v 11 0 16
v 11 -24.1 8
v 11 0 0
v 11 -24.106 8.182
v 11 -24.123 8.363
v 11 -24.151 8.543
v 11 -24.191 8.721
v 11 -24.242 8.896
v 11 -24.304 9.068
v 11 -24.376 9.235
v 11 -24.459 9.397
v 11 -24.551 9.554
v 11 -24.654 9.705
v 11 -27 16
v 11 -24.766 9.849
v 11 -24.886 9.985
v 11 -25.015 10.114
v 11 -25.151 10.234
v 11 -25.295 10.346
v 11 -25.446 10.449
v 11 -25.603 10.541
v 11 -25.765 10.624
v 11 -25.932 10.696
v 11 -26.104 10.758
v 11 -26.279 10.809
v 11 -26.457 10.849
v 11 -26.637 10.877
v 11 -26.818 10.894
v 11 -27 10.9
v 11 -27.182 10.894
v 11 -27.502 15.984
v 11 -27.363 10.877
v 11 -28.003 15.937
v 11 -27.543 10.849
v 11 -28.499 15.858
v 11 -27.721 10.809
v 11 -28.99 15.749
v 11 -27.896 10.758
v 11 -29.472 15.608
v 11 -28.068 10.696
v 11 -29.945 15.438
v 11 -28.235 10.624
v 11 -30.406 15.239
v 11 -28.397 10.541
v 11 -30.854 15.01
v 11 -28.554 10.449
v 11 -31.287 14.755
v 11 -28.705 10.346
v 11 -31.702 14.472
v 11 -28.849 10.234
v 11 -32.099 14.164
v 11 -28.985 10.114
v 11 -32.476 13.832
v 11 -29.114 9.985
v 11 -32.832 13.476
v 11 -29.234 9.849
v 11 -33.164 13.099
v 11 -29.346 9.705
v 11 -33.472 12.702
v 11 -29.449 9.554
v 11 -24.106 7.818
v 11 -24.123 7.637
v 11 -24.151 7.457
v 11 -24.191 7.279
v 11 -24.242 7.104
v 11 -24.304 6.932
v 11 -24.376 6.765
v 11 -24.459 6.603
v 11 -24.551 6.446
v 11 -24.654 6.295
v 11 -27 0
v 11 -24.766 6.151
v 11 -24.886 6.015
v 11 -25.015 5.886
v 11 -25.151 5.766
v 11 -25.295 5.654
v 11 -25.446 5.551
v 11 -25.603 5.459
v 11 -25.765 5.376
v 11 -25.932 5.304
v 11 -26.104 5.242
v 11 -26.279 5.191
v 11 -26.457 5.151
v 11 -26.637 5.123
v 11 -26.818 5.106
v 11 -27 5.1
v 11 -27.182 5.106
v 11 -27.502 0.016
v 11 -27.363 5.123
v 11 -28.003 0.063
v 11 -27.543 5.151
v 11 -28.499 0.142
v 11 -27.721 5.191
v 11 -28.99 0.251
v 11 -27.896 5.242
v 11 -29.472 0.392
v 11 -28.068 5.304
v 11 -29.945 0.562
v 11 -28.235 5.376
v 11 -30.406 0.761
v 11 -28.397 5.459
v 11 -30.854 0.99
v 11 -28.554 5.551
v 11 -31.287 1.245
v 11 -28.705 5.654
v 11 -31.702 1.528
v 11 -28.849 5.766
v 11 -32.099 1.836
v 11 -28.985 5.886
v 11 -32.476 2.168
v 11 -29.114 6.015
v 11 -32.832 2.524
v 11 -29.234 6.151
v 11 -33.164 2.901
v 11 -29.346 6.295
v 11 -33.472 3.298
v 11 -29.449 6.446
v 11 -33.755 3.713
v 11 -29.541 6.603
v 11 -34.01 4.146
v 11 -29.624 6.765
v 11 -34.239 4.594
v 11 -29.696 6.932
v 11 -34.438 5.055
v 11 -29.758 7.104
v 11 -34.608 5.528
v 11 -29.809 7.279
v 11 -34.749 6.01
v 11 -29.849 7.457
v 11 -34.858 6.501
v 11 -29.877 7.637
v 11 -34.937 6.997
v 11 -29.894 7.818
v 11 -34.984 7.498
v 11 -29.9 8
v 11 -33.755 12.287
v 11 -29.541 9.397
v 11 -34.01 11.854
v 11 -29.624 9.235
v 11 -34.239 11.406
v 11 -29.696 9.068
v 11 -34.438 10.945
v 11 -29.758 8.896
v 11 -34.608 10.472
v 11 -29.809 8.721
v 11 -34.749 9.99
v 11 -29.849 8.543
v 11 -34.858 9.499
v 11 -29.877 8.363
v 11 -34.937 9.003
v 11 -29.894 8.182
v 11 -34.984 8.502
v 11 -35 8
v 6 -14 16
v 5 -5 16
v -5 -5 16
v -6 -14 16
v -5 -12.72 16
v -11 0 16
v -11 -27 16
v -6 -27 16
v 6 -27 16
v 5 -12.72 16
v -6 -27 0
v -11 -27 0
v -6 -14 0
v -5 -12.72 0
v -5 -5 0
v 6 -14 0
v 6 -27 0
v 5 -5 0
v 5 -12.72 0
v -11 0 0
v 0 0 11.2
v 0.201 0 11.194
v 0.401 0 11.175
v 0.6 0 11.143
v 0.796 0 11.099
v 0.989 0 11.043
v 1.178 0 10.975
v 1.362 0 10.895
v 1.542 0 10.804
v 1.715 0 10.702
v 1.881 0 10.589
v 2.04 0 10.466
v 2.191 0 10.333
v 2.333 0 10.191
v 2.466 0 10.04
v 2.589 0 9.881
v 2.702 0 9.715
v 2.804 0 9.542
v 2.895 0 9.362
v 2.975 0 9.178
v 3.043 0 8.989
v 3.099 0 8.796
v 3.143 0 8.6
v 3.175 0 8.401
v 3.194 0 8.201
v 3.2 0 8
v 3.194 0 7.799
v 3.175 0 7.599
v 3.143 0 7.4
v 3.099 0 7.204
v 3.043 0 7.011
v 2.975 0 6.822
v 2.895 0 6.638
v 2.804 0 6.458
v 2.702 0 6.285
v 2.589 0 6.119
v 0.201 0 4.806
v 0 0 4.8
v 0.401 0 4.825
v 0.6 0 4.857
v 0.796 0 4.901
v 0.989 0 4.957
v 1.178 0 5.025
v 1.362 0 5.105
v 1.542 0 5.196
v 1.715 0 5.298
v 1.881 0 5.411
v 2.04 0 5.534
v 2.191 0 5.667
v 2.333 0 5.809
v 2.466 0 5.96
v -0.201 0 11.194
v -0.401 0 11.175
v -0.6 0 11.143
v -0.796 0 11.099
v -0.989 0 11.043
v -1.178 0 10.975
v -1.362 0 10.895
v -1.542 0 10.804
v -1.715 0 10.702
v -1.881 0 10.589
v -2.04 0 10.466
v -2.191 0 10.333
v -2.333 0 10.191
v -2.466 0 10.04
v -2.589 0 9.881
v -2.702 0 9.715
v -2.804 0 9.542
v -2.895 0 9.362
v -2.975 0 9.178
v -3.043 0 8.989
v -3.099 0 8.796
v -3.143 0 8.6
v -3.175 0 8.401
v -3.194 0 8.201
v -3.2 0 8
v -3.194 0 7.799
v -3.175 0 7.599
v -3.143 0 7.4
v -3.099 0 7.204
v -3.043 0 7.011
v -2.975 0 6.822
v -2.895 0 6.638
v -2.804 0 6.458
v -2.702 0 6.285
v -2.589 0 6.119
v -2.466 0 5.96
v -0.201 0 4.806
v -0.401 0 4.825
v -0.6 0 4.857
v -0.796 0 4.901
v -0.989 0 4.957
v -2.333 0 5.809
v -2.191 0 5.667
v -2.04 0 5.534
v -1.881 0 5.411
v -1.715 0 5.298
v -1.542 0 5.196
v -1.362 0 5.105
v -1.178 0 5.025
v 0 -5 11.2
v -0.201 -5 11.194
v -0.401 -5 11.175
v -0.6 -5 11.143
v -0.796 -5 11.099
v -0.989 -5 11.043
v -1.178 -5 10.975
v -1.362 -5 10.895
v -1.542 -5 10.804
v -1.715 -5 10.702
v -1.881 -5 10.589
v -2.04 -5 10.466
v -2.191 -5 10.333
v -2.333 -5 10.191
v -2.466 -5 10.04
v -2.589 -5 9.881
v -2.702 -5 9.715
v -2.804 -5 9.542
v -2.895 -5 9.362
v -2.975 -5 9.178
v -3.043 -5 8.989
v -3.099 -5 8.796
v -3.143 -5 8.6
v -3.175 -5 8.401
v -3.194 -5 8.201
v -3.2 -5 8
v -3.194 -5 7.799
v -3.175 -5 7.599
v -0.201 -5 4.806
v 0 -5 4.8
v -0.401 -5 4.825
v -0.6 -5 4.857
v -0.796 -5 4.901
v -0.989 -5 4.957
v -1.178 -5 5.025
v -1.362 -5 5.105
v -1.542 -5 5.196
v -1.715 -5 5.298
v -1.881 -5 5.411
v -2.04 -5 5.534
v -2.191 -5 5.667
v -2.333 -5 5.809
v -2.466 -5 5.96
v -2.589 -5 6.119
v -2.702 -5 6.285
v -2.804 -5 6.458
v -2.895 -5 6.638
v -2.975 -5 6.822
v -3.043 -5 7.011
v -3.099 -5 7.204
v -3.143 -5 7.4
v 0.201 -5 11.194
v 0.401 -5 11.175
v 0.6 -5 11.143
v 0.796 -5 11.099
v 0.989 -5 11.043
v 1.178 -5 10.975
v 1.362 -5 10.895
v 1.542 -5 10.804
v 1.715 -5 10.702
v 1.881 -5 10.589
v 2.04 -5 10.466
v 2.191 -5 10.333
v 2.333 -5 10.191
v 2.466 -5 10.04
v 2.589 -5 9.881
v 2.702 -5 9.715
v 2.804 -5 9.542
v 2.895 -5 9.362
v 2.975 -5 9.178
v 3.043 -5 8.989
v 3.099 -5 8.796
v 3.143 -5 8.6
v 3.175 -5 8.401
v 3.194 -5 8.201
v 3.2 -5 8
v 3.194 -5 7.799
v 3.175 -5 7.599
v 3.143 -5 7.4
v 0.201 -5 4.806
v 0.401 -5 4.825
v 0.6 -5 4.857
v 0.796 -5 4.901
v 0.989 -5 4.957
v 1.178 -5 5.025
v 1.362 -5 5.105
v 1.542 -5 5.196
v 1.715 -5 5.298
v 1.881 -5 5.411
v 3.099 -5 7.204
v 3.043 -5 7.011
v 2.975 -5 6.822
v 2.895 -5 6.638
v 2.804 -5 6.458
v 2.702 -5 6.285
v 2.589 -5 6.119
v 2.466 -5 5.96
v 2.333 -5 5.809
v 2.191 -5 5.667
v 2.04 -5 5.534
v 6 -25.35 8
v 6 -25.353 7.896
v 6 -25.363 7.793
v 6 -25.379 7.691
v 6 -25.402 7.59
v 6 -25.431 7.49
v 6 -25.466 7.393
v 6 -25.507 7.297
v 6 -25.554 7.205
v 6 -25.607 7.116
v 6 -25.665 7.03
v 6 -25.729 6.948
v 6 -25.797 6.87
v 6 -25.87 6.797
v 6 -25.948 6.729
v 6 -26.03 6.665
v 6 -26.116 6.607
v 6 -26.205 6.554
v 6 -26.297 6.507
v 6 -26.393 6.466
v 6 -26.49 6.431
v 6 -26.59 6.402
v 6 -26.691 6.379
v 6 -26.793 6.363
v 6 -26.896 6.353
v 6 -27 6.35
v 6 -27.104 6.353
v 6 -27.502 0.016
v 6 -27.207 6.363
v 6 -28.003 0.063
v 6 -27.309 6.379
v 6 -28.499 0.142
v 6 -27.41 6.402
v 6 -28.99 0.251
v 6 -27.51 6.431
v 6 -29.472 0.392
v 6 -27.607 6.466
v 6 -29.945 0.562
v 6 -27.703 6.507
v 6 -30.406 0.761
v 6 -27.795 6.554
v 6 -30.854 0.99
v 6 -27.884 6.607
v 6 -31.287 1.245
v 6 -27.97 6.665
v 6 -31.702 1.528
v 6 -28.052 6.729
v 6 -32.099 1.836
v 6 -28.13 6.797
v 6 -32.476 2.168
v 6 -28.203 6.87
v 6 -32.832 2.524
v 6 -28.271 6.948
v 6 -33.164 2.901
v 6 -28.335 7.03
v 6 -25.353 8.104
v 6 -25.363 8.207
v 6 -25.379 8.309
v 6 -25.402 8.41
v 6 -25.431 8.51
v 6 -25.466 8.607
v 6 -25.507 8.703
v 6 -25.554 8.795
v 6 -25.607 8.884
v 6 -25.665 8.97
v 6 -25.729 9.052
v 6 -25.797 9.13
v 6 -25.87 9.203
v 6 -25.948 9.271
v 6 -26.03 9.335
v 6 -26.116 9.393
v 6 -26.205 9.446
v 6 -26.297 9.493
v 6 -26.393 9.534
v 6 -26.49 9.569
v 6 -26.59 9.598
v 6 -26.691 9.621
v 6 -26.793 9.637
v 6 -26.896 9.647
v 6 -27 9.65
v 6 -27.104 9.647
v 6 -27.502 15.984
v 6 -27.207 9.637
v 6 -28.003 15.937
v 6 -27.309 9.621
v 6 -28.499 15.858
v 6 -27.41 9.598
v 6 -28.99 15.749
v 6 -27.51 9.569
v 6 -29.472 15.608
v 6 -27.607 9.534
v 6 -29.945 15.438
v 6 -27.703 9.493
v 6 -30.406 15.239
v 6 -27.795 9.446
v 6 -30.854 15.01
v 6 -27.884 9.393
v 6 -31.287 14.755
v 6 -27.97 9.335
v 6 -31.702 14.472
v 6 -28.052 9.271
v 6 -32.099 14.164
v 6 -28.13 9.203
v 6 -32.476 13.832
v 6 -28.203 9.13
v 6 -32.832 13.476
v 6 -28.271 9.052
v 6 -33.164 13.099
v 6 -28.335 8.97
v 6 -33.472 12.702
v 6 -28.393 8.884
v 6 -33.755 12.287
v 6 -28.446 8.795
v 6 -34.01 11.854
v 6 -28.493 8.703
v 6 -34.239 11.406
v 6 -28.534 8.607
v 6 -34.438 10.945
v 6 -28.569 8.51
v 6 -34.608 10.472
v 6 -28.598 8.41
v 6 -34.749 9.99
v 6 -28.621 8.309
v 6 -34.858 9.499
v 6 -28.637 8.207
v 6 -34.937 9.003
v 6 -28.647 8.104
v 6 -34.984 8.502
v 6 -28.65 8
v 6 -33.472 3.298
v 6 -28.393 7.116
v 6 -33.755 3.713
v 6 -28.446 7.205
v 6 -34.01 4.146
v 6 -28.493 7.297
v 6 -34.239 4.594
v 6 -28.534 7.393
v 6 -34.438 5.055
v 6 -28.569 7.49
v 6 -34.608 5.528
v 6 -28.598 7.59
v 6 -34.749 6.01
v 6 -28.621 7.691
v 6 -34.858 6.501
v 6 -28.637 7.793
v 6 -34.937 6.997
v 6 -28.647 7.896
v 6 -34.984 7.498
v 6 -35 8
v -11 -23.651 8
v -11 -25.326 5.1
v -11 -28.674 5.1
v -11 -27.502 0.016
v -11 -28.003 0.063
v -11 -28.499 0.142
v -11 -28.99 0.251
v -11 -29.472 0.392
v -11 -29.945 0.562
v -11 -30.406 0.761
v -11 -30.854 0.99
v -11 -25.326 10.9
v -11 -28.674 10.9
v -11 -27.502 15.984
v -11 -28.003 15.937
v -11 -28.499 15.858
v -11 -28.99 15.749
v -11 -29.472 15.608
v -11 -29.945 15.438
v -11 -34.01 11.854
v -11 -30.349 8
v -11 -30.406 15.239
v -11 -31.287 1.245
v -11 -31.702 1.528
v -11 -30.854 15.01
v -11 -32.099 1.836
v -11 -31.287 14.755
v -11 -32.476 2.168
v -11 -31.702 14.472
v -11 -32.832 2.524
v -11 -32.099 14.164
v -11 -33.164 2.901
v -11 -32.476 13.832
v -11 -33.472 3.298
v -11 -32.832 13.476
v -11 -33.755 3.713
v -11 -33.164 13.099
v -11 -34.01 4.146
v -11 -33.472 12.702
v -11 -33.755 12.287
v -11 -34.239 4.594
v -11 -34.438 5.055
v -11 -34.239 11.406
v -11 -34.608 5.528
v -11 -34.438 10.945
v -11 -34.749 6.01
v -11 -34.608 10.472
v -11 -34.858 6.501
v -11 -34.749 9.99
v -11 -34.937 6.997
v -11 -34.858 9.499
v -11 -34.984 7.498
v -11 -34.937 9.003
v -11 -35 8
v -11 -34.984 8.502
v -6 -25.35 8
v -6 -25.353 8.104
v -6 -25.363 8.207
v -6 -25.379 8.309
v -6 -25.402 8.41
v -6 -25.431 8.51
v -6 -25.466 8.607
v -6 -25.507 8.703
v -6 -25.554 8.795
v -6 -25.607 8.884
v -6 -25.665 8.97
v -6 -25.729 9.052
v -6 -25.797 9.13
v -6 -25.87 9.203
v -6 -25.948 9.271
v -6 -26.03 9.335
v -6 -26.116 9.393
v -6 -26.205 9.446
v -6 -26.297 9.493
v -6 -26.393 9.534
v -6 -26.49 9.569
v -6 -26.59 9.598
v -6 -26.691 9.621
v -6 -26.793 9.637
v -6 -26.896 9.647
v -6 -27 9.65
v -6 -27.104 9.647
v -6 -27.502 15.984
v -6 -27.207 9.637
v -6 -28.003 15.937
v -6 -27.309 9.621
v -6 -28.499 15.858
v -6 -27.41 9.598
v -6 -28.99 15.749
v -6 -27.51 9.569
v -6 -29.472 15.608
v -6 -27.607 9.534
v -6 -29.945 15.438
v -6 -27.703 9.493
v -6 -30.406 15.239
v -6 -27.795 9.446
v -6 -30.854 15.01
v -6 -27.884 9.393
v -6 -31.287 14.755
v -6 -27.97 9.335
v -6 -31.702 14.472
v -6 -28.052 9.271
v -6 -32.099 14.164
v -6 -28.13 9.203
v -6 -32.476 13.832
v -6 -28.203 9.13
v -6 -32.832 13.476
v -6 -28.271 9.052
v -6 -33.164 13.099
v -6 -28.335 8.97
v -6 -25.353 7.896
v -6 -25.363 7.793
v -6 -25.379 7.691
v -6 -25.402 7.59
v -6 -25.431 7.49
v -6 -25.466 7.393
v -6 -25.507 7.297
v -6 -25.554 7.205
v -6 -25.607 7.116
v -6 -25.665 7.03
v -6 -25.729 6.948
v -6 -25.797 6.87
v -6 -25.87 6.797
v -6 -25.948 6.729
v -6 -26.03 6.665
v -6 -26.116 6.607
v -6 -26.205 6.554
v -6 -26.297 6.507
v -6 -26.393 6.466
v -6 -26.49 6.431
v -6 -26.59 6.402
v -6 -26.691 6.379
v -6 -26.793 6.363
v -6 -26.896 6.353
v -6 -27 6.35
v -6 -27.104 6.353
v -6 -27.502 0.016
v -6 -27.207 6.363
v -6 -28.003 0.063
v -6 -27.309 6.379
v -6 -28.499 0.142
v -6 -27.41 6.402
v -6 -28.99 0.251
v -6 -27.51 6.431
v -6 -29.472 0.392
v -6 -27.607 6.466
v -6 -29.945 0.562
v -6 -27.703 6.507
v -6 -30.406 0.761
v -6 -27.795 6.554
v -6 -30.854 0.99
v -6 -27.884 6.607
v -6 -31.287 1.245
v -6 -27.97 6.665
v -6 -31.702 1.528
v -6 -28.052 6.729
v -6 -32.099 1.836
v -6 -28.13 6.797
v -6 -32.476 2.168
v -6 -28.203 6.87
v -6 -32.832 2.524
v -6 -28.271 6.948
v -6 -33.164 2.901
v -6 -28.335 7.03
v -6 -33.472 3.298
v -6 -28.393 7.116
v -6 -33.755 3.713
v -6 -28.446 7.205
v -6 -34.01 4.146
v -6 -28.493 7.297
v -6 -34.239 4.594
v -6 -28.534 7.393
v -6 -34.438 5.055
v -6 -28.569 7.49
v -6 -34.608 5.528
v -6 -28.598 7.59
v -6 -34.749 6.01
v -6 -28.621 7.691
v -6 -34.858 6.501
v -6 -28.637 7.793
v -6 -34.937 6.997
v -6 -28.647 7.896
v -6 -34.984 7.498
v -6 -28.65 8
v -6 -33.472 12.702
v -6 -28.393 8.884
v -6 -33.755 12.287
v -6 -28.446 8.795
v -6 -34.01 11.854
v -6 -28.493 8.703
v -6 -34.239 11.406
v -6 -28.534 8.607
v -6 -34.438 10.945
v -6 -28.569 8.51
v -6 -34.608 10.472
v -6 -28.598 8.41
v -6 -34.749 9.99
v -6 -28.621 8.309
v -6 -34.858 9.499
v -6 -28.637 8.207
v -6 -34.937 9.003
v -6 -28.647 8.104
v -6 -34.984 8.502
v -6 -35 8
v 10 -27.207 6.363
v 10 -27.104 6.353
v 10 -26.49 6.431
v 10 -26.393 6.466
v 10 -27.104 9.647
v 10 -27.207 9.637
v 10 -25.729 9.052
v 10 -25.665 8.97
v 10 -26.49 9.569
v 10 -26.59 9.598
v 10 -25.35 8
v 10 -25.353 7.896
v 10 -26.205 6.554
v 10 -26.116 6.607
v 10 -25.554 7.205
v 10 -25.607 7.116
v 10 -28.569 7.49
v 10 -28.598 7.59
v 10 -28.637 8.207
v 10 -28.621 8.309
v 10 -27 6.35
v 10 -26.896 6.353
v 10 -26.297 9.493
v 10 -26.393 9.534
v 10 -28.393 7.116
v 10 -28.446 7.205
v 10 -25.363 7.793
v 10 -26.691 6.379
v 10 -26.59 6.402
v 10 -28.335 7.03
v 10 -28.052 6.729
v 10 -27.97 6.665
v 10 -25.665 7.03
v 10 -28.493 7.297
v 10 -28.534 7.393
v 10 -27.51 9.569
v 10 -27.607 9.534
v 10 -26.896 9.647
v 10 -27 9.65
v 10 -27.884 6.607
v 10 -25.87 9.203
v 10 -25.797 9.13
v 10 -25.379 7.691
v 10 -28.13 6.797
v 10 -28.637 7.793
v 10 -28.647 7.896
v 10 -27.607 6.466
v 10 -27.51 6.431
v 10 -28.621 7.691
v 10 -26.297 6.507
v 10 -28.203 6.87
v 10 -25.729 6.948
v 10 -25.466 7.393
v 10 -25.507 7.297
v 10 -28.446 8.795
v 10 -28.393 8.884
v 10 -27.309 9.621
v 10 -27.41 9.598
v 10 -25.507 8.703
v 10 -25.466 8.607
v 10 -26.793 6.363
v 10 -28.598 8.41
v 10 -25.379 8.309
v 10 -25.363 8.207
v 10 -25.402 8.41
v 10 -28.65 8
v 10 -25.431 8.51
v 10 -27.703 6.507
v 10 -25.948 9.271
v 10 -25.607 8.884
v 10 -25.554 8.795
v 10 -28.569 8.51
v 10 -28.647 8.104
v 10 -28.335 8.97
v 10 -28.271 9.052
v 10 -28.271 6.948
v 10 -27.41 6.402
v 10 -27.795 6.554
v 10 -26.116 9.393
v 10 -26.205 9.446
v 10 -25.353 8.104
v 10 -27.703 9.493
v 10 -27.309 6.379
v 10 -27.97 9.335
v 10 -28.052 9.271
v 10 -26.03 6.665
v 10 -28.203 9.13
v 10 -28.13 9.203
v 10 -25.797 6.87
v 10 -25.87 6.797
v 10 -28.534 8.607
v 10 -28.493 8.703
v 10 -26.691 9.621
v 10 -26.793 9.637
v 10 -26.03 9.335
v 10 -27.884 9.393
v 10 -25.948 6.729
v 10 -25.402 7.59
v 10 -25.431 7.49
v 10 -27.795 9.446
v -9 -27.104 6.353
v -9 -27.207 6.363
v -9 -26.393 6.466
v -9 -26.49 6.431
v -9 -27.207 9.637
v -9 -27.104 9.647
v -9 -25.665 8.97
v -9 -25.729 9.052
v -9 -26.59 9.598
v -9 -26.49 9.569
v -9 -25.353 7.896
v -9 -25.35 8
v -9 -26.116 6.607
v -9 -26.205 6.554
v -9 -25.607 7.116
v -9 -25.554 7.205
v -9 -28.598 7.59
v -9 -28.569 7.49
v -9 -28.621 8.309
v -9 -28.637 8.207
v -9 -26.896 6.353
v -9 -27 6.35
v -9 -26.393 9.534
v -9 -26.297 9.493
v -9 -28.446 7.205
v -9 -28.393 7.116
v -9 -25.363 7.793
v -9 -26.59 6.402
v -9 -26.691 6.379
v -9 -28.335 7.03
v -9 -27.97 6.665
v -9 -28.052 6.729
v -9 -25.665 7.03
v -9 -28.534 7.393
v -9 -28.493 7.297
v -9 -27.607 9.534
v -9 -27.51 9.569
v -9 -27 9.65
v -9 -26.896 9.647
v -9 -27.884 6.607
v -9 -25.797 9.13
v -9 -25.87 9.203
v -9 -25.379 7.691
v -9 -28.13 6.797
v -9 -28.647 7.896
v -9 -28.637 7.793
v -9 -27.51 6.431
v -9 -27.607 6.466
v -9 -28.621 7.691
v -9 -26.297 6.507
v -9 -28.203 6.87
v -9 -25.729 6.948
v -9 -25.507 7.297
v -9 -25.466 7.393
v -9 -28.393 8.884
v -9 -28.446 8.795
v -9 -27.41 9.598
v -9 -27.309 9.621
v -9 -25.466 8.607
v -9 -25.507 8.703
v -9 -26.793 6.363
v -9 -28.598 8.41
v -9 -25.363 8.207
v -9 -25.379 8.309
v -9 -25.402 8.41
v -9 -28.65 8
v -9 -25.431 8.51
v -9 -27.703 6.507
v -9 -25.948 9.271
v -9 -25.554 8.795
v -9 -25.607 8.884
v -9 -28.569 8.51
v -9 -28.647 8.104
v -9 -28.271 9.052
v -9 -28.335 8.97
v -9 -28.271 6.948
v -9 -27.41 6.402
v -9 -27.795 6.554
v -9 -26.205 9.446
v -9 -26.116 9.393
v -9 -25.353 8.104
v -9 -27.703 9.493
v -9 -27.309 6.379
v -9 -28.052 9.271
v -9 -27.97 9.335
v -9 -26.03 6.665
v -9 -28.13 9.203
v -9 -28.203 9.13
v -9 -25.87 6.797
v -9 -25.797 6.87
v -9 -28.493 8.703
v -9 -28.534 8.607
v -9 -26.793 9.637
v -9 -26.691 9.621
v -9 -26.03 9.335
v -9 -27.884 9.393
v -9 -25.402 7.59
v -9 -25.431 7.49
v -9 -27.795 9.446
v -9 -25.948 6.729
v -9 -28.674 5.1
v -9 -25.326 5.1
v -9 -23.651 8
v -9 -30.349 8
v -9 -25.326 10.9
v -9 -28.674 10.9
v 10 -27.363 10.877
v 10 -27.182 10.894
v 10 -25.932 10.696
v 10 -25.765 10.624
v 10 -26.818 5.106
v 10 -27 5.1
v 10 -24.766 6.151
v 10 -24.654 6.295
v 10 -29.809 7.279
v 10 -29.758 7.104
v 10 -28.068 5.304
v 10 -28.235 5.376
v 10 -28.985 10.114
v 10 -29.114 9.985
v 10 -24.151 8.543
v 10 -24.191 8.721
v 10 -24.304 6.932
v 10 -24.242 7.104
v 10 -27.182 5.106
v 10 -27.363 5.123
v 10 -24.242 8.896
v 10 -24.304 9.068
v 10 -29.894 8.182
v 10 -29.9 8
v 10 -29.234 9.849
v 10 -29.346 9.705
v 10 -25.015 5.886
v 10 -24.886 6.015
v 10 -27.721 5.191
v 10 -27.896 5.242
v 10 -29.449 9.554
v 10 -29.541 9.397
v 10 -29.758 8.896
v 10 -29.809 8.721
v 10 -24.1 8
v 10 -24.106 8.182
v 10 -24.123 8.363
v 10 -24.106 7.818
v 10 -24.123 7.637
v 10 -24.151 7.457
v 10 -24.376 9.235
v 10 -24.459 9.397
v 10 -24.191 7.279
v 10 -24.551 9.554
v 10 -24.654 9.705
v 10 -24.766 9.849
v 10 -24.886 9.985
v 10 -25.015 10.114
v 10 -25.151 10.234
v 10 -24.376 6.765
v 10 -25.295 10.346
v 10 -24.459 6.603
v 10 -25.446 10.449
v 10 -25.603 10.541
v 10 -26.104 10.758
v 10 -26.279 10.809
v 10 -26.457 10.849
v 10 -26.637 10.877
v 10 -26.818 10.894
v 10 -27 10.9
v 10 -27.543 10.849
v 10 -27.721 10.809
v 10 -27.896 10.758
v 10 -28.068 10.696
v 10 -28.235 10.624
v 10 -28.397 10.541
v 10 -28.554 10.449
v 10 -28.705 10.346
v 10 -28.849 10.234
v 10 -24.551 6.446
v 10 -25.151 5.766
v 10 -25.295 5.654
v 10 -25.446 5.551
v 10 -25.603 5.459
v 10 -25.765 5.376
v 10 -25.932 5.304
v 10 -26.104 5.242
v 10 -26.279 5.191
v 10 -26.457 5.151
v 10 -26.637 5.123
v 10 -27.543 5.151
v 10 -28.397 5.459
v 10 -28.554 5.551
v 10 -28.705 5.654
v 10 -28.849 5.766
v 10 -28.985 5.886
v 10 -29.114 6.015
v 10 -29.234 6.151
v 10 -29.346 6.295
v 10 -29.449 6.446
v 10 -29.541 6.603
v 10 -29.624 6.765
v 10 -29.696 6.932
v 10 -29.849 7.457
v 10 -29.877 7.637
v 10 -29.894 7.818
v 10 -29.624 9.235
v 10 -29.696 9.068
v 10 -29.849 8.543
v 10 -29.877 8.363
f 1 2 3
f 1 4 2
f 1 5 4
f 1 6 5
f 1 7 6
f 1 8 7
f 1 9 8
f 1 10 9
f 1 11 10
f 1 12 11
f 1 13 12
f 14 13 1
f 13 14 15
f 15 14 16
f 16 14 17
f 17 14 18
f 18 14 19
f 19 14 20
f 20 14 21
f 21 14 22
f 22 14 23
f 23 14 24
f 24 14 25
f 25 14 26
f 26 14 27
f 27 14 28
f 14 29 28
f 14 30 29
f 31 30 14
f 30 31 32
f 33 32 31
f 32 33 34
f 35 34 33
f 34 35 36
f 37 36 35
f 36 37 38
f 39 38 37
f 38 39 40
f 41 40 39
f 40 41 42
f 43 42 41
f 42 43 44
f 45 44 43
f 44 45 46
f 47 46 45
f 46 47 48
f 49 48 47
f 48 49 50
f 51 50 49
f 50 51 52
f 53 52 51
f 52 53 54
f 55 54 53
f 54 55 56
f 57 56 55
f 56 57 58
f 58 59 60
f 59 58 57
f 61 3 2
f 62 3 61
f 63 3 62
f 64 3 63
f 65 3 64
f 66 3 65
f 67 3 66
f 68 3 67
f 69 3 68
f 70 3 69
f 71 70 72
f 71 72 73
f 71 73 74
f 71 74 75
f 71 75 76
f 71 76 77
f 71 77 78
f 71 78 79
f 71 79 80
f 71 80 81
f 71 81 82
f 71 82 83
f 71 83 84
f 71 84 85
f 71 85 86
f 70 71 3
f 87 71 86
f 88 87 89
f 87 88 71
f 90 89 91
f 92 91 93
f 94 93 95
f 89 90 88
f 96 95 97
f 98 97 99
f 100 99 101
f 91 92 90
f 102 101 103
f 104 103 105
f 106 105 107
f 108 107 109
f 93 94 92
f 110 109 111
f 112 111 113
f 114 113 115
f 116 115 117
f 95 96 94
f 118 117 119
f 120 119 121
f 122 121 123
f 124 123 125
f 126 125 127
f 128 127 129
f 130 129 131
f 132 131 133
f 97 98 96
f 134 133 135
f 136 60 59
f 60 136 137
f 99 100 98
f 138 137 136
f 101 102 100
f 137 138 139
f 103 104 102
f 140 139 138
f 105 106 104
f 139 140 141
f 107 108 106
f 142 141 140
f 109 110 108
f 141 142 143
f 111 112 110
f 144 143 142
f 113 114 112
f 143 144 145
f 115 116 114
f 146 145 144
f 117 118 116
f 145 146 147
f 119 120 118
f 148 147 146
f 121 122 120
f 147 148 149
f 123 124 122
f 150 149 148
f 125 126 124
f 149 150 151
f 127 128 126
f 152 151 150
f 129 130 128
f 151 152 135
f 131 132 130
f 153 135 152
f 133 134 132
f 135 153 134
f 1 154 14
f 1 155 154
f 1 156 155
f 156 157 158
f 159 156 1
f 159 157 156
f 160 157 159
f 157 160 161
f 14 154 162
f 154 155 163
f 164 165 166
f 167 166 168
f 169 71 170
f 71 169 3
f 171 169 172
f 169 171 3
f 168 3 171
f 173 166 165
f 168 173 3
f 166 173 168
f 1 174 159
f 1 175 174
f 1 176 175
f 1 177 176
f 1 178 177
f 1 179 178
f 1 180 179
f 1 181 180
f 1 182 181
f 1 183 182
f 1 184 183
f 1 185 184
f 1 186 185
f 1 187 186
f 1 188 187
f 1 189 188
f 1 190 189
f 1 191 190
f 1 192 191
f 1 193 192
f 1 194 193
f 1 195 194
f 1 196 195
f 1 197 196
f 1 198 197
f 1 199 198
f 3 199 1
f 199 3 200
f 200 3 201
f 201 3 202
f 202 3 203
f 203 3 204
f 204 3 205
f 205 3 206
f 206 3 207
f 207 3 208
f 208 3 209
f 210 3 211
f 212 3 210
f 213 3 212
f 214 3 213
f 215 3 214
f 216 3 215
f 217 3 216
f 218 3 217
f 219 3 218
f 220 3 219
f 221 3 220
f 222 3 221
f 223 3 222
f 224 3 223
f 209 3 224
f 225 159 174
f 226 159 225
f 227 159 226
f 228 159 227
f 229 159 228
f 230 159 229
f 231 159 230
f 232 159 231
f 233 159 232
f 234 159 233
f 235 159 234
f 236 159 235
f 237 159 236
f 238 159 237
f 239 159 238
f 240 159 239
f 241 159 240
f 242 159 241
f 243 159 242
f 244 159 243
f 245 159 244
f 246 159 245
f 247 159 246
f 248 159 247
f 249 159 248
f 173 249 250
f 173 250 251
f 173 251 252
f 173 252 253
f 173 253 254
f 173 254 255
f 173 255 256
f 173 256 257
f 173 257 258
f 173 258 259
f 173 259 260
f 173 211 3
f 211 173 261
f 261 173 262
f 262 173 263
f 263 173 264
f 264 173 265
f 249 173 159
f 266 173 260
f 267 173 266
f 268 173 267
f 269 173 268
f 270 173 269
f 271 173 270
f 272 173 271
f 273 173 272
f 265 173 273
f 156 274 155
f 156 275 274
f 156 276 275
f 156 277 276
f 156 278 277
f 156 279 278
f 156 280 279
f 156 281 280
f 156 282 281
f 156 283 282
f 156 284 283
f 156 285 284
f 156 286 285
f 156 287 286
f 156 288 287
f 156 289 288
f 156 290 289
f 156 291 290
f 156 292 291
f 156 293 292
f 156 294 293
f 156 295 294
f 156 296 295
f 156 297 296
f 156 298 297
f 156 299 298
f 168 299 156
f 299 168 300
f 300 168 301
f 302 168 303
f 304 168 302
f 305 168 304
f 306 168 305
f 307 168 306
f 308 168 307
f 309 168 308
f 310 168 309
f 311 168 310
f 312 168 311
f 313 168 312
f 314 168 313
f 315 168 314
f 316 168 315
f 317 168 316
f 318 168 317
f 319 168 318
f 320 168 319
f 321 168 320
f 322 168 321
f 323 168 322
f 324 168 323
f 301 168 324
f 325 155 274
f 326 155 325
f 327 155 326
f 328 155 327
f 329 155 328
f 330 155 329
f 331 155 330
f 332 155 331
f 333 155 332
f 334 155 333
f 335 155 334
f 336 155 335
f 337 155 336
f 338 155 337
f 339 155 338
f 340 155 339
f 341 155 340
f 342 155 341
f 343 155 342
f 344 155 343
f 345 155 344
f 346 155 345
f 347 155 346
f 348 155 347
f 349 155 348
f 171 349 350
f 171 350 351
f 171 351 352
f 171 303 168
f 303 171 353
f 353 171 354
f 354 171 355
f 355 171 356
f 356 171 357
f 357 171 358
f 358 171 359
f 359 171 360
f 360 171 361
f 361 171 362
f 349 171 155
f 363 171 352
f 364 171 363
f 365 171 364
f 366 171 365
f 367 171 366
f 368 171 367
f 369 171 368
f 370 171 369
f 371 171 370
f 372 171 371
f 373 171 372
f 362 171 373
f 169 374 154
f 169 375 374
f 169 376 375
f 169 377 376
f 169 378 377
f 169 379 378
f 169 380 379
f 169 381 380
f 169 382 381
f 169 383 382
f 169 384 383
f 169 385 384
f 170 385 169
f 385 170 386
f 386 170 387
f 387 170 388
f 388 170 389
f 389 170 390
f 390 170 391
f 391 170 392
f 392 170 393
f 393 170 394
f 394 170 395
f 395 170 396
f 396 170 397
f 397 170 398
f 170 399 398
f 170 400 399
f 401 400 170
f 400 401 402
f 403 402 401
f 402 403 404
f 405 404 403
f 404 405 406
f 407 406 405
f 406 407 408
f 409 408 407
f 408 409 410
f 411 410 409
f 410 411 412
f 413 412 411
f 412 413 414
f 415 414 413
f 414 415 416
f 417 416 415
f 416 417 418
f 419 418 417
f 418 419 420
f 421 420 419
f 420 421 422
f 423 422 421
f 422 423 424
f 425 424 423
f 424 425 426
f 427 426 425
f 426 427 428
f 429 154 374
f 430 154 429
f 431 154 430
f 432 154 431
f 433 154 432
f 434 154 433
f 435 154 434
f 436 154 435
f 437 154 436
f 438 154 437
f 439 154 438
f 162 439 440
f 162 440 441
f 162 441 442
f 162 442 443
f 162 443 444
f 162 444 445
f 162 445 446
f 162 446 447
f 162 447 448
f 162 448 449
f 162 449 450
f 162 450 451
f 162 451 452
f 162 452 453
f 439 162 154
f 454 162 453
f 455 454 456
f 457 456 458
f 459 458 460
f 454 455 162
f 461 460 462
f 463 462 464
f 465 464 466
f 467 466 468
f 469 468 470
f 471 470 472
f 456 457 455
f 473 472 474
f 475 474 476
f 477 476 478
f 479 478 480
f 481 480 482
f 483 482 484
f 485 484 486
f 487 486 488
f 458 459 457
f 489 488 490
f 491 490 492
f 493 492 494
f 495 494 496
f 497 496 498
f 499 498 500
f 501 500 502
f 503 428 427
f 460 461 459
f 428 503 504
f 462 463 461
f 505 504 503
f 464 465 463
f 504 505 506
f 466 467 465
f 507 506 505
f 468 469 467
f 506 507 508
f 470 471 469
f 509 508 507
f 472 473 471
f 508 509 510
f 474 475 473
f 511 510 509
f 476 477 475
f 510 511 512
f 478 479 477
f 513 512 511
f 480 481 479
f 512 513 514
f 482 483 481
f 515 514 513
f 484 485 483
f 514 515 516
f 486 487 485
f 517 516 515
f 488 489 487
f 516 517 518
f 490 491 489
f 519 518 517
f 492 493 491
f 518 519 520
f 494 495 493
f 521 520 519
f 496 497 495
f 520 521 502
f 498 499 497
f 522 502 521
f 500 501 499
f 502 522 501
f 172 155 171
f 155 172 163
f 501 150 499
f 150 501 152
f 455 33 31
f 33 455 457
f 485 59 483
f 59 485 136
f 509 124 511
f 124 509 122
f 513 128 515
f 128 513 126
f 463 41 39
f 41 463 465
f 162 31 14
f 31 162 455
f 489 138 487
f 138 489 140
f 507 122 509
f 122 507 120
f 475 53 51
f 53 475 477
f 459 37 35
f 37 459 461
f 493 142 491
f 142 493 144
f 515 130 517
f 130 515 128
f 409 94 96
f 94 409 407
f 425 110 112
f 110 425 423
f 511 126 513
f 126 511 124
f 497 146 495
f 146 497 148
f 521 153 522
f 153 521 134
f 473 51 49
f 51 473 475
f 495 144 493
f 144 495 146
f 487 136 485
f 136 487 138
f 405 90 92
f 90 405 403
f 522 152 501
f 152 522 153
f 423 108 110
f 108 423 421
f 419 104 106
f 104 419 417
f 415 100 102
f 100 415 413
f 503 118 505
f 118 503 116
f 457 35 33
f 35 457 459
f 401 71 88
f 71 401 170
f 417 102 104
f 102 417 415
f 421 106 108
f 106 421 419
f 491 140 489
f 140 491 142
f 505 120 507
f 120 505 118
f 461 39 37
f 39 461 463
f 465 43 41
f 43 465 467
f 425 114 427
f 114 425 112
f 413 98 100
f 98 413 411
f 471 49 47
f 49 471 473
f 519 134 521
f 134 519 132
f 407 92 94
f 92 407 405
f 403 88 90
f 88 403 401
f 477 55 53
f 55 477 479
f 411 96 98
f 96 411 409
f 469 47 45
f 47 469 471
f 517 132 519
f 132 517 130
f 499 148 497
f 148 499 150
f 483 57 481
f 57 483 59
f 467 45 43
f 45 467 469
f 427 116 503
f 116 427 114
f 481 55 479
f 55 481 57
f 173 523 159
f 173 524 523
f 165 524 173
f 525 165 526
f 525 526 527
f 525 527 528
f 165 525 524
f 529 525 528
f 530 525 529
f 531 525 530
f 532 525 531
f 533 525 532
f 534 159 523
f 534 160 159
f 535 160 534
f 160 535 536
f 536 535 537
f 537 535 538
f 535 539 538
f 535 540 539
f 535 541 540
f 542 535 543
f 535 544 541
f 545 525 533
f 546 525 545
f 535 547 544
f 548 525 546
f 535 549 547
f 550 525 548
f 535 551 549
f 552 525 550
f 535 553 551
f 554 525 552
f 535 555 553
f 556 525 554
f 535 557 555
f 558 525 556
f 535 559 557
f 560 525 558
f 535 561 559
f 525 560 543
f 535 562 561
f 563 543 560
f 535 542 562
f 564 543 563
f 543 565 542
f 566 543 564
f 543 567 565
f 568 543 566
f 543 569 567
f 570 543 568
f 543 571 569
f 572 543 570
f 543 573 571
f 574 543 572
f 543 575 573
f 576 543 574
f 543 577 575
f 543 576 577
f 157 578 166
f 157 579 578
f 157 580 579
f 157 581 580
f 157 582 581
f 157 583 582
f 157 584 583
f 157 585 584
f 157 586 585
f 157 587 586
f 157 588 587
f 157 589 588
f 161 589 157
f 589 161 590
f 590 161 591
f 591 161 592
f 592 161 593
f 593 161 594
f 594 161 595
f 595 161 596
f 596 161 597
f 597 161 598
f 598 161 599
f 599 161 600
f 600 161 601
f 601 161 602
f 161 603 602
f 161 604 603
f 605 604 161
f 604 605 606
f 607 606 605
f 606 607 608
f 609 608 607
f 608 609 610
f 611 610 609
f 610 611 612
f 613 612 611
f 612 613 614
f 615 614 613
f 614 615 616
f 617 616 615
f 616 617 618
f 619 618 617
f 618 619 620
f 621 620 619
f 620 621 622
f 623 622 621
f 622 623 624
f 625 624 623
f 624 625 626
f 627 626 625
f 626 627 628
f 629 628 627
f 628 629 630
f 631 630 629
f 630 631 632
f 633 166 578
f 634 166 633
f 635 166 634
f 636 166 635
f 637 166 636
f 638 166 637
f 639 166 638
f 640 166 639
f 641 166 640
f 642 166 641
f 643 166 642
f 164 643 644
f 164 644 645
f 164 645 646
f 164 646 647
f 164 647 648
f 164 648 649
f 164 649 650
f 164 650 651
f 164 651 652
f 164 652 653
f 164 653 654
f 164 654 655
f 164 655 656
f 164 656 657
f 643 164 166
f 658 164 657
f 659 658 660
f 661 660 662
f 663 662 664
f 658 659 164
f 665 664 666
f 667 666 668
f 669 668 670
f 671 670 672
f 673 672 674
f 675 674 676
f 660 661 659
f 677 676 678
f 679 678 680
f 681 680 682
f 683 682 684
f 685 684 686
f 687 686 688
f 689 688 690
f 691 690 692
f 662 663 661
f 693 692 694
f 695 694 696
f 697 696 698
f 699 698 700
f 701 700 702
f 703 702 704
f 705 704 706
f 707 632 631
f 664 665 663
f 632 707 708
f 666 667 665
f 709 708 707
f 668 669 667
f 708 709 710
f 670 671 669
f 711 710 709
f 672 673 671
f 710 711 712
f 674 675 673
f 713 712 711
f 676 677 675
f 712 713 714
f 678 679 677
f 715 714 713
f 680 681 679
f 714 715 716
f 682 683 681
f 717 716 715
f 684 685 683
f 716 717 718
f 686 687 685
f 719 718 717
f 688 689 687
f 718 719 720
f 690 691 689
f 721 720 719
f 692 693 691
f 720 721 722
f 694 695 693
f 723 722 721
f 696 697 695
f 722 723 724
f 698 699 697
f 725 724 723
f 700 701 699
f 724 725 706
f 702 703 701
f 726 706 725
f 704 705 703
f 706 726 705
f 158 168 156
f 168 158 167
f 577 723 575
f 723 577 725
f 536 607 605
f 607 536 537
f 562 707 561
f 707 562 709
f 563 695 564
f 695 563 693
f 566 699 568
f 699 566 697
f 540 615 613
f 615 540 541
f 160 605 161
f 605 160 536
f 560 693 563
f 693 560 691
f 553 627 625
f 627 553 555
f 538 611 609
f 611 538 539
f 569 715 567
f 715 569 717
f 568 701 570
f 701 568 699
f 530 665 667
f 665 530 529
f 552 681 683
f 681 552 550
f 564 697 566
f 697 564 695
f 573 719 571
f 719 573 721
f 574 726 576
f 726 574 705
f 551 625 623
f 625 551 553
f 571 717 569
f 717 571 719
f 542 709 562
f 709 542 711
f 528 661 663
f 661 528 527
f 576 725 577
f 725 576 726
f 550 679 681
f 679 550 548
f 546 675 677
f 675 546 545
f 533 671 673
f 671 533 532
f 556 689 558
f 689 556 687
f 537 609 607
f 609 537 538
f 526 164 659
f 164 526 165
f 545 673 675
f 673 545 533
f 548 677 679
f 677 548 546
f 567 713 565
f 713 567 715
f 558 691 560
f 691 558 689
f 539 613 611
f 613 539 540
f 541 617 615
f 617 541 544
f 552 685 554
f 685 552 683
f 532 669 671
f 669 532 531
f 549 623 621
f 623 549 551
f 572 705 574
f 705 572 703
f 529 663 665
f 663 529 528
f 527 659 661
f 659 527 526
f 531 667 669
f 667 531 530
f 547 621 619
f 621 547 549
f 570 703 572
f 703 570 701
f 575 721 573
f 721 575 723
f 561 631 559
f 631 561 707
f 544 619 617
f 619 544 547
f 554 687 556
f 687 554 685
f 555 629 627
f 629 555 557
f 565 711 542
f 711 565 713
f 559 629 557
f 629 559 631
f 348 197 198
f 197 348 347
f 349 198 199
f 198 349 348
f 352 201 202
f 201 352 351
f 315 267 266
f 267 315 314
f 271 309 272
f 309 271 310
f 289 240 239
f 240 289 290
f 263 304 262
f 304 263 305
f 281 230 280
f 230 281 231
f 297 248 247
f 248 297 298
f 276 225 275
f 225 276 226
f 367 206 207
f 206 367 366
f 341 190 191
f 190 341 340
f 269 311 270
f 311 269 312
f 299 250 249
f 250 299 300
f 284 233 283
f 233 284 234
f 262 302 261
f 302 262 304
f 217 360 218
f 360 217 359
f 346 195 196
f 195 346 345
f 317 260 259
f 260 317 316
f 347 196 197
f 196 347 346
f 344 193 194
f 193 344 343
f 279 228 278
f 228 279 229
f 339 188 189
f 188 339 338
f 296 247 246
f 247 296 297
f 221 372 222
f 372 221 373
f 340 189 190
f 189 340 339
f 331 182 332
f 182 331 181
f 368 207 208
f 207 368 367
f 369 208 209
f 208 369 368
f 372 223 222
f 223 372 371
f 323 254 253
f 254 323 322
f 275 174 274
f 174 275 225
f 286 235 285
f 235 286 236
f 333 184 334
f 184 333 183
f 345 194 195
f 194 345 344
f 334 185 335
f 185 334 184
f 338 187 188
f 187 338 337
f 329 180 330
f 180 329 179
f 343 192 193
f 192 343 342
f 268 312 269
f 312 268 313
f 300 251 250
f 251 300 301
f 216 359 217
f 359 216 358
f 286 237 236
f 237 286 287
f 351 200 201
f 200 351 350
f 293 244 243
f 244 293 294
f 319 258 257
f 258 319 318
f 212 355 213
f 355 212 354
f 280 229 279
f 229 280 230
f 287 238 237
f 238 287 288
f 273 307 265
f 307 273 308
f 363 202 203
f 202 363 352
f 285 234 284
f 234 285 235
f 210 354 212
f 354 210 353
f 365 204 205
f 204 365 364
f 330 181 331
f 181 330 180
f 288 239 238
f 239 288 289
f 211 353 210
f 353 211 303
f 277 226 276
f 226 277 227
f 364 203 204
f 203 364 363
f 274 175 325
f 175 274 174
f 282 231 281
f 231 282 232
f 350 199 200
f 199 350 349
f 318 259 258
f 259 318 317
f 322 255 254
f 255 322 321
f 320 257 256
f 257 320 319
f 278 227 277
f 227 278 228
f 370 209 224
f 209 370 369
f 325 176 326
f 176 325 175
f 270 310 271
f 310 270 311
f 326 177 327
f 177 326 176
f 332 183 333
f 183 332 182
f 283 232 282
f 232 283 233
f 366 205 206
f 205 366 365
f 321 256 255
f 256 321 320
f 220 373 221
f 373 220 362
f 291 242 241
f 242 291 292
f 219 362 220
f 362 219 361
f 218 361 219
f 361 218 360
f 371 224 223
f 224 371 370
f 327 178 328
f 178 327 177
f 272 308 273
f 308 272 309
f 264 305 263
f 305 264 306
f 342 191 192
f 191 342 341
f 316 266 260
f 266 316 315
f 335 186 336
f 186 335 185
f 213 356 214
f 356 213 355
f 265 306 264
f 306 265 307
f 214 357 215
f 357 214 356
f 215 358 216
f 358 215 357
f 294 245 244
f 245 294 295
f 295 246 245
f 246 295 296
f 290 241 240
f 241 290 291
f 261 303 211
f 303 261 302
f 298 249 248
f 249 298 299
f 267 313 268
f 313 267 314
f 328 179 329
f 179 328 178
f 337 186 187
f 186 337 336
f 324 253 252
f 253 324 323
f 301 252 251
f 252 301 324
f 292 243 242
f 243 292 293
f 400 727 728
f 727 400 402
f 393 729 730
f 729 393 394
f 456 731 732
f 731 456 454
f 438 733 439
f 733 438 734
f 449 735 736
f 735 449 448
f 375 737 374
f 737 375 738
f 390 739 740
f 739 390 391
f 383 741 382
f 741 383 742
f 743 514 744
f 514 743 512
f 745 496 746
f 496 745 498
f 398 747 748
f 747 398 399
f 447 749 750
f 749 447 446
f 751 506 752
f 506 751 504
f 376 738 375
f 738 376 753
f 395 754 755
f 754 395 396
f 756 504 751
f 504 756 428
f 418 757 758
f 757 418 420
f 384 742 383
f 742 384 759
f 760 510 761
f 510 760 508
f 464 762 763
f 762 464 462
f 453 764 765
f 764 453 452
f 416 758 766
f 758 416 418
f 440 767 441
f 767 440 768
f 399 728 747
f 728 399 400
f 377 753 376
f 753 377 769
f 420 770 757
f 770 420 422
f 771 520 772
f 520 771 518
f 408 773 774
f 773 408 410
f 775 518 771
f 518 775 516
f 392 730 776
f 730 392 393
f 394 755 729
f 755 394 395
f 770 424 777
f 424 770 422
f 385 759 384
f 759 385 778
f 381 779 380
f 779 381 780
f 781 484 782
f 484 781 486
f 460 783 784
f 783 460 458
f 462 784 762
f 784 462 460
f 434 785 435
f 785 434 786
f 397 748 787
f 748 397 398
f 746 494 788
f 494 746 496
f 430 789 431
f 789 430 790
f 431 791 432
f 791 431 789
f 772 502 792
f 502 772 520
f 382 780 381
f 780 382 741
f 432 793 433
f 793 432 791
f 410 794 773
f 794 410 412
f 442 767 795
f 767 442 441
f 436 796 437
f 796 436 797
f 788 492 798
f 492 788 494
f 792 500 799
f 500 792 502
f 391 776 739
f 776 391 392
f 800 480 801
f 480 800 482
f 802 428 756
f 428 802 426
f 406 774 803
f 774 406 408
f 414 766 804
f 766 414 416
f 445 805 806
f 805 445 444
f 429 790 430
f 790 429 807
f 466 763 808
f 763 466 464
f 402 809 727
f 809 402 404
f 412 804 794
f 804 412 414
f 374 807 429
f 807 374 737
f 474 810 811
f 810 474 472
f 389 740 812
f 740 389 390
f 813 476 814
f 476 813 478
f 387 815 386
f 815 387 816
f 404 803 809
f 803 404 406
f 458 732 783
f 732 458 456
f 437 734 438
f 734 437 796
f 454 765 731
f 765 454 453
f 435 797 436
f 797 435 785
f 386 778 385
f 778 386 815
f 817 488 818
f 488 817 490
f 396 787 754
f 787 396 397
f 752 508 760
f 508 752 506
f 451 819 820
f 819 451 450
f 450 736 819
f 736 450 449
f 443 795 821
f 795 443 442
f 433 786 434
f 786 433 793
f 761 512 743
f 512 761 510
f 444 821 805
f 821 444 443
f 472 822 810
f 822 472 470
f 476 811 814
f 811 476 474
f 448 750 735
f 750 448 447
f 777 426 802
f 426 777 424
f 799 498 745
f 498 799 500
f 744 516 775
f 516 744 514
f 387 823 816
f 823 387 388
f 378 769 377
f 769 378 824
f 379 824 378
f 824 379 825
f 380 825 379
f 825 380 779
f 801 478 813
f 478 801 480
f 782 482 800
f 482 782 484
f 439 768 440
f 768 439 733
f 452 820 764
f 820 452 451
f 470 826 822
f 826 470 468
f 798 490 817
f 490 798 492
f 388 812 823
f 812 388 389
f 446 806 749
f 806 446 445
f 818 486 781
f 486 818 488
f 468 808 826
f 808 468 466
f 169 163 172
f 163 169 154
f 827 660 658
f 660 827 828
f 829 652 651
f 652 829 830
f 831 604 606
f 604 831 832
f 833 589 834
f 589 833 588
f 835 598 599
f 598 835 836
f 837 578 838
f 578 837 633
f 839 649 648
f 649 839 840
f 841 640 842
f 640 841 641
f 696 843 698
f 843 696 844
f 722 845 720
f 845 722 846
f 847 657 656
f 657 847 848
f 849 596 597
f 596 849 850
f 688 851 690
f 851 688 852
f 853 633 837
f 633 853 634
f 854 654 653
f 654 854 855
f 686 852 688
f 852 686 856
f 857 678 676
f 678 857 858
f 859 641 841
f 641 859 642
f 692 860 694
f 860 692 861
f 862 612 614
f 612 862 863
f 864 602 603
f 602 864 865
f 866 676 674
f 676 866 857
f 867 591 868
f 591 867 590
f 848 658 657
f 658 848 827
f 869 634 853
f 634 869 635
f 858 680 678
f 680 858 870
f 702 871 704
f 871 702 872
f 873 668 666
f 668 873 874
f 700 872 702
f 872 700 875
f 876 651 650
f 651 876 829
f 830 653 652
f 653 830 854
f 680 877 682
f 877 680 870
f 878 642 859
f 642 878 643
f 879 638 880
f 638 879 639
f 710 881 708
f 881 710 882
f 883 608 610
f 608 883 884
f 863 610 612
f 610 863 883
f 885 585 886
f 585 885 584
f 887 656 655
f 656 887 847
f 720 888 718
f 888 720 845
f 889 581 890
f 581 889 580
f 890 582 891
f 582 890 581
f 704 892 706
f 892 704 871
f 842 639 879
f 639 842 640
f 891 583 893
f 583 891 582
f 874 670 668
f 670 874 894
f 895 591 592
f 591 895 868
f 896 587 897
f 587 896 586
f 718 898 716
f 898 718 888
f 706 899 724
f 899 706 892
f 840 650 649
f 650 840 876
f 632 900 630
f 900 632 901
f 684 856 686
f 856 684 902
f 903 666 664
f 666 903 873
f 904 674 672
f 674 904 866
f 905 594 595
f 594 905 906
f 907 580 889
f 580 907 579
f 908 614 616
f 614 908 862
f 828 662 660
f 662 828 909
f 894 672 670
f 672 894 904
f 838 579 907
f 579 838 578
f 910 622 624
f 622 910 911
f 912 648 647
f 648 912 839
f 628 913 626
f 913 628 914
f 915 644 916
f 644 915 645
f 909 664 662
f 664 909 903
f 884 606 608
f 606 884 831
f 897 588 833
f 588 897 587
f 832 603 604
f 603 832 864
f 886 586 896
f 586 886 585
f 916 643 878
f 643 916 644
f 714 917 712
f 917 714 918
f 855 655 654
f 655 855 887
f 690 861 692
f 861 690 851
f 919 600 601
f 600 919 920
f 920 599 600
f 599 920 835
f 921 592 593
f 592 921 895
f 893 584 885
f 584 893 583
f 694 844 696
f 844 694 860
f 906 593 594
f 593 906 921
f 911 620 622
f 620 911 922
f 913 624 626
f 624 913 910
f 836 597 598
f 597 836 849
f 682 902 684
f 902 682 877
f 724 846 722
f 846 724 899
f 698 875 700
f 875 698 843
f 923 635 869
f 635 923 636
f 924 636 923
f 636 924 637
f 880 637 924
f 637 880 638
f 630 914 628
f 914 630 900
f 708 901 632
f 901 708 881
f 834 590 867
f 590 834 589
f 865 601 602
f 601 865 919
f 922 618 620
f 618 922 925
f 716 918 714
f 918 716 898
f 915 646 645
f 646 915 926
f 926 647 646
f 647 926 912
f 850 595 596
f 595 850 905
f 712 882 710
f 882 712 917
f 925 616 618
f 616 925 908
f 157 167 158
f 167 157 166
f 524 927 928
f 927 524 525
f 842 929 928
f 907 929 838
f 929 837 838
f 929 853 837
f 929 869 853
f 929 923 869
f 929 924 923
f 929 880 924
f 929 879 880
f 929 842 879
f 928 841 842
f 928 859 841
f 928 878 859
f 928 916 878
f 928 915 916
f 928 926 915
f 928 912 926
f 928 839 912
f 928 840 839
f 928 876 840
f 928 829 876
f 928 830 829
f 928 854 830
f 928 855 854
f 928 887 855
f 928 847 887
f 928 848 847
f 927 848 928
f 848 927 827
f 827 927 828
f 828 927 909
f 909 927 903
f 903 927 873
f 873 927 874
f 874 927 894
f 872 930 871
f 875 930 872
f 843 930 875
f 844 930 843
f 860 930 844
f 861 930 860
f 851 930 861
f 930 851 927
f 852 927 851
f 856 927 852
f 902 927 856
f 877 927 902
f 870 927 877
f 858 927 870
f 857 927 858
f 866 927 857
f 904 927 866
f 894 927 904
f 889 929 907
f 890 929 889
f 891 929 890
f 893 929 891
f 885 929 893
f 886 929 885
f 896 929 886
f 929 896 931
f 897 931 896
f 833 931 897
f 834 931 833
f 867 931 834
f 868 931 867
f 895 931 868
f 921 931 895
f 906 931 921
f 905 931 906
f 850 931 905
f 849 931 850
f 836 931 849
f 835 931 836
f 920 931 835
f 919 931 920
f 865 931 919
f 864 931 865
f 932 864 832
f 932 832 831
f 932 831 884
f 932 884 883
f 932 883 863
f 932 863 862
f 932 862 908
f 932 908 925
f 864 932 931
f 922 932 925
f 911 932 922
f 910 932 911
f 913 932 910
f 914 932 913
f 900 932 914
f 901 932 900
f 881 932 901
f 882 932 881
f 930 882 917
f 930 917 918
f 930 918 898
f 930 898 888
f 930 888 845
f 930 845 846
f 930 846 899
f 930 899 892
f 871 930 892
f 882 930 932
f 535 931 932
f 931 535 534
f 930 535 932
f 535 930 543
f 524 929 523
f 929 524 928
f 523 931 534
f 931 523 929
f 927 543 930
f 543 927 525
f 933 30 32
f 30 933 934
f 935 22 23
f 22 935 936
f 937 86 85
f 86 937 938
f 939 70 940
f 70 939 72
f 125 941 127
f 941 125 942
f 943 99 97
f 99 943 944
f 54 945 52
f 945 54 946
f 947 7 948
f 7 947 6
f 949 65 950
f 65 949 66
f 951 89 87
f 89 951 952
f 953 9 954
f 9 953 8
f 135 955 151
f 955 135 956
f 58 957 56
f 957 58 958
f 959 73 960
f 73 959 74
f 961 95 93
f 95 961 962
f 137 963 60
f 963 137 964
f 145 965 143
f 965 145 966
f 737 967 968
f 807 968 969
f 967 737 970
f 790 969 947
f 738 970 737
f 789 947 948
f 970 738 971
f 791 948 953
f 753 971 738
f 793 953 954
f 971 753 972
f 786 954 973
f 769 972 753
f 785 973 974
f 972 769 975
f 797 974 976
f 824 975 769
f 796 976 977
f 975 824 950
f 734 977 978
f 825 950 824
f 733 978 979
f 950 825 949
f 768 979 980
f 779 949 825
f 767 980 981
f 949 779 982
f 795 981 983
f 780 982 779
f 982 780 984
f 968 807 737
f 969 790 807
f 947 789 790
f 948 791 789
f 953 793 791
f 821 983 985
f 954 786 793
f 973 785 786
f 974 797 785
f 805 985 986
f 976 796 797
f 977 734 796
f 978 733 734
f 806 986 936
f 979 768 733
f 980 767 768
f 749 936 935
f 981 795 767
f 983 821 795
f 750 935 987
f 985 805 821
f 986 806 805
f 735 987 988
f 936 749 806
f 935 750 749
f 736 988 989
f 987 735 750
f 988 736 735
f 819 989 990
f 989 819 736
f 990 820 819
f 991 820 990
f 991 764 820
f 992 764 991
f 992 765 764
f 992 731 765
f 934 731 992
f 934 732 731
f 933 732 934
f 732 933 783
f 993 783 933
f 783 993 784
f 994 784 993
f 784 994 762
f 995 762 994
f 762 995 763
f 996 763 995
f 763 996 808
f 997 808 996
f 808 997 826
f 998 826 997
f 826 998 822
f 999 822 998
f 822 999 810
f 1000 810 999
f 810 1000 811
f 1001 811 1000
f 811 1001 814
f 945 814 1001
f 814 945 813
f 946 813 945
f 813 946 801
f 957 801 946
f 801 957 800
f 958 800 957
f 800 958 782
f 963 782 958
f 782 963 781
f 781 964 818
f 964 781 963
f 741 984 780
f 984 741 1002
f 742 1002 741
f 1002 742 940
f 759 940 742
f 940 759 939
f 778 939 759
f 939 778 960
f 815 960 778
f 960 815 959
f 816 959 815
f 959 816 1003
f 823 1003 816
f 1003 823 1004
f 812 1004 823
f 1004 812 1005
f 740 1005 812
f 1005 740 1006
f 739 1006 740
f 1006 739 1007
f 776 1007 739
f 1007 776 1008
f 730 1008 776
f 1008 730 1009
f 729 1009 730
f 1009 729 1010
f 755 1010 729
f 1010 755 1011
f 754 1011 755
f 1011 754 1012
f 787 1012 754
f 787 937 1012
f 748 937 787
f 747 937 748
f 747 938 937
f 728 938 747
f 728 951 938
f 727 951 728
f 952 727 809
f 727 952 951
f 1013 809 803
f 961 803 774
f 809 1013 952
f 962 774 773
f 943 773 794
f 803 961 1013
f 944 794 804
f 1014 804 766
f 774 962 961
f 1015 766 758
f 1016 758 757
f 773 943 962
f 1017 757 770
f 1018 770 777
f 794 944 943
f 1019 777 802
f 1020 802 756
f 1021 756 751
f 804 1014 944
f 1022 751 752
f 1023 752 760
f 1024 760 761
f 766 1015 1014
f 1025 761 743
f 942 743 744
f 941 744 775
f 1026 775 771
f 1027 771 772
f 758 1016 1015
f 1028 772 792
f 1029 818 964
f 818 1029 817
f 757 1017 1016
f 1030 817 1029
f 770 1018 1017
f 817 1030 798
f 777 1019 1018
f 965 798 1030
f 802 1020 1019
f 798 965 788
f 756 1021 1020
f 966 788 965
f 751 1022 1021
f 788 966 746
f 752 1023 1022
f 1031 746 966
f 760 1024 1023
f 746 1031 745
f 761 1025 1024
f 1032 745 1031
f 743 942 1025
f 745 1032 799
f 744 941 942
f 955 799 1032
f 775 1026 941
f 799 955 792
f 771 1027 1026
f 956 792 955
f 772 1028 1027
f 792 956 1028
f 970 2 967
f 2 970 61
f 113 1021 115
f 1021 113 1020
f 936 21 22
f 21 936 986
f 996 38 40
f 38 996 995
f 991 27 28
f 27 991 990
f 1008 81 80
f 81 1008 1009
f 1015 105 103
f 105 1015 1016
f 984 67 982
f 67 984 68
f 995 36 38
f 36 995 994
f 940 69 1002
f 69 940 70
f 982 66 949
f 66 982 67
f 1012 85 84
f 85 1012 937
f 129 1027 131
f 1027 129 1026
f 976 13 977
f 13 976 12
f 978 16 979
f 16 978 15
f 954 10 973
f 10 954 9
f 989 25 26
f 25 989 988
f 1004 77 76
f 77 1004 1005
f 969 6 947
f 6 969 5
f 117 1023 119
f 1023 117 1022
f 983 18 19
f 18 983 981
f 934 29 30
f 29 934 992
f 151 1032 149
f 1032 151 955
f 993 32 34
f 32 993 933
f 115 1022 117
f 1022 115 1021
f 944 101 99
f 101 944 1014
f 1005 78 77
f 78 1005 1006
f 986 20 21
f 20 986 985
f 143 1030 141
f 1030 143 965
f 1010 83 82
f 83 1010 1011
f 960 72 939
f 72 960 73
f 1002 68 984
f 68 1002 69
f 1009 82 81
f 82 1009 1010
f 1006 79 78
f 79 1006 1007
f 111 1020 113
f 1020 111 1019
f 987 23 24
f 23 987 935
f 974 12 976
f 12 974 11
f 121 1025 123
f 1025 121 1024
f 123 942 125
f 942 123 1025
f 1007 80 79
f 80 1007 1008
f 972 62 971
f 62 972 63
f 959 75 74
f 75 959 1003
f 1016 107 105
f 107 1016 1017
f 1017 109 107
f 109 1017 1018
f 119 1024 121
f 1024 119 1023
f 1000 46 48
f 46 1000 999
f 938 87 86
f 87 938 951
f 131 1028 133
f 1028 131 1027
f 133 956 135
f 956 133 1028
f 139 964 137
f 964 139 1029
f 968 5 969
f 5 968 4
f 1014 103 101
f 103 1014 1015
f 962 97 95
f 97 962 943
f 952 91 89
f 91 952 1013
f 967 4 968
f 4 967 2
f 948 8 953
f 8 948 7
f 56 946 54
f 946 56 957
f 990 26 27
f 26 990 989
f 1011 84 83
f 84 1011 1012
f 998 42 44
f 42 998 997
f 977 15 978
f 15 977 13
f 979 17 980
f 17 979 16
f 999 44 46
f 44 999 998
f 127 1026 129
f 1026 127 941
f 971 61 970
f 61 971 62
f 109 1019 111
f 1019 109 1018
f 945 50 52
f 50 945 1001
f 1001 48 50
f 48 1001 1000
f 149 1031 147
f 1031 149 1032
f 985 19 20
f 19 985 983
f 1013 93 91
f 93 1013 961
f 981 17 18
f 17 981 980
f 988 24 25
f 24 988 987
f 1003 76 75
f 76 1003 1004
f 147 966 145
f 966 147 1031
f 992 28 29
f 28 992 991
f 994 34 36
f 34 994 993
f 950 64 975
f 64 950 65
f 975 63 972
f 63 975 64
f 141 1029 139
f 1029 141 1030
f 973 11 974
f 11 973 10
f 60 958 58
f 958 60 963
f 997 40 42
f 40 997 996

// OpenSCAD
// Created from Code_Yidler_623.stl
// https://github.com/Mecan0/Code
// By J.Rodigo (www.jra.so)
// Licence Creative commons atribution & share alike.


// Media pieza
module mpieza(){
	// Bloque a lo largo del eje X
	translate([0, -5, 0])
	cube([11, 5, 16]);

	//	Bloque a lo largo del eje Y
	//	Bloque grande
		translate([6, -27, 0])
		cube([5, 27, 16]);
	//	Bloque pequeño
		translate([5, -14, 0])
		cube([1, 9, 16]);	
	//	Redondeo
		translate([6, -27, 8])
		rotate( 90, [0, 1, 0])
		cylinder(h = 5, r = 8, $fn=100);
}

// Operaciones para media pieza
module moperaciones(){
	// Taladro del soporte
	translate([0, 1, 8])
	rotate( 90, [1, 0, 0])
	cylinder(h = 7, r = 3.2, $fn=100);
	// Taladro para la polea
	translate([5, -27, 8])
	rotate( 90, [0, 1, 0])
	cylinder(h = 7, r = 1.65, $fn=100);
	// Chaflan interior
	translate([6, -14, -1])
	rotate( 232, [0, 0, -1])
	cube([2, 1, 18]);
}

// Generar un hexágono circunscrito (Diametro,altura) 
module hexagono(d,h){ 
	for (a = [0, 60,120]){ 
		rotate( a, [0, 0, 1])
		cube([d, d*tan(30), h], center = true);
	}
}

// Generamos la pieza y las operaciones
difference () {
	union() {
		// Pieza situada en {+X,-Y,+Z}
		mpieza();
		
		// Pieza simetrica situada en {-X,-Y,+Z}
		mirror([ 1, 0, 0 ])
		mpieza();
	}	
	union() {
		// Operaciones situadas en {+X,-Y,+Z}
		moperaciones();
		// Operaciones simetricas situadas en {-X,-Y,+Z}
		mirror([ 1, 0, 0 ])
		moperaciones();

		// Operaciones unicas para cada lado
		// Vaciado para la tuerca hexagonal 
		translate([-11, -27, 8])
		rotate( 90, [0, 1, 0])
		hexagono(5.8, 4);
		// Vaciado para la cabeza del tornillo
		translate([10, -27, 8])
		rotate( 90, [0, 1, 0])
		cylinder(h = 2, r = 2.9, $fn=100);
	}	
}
